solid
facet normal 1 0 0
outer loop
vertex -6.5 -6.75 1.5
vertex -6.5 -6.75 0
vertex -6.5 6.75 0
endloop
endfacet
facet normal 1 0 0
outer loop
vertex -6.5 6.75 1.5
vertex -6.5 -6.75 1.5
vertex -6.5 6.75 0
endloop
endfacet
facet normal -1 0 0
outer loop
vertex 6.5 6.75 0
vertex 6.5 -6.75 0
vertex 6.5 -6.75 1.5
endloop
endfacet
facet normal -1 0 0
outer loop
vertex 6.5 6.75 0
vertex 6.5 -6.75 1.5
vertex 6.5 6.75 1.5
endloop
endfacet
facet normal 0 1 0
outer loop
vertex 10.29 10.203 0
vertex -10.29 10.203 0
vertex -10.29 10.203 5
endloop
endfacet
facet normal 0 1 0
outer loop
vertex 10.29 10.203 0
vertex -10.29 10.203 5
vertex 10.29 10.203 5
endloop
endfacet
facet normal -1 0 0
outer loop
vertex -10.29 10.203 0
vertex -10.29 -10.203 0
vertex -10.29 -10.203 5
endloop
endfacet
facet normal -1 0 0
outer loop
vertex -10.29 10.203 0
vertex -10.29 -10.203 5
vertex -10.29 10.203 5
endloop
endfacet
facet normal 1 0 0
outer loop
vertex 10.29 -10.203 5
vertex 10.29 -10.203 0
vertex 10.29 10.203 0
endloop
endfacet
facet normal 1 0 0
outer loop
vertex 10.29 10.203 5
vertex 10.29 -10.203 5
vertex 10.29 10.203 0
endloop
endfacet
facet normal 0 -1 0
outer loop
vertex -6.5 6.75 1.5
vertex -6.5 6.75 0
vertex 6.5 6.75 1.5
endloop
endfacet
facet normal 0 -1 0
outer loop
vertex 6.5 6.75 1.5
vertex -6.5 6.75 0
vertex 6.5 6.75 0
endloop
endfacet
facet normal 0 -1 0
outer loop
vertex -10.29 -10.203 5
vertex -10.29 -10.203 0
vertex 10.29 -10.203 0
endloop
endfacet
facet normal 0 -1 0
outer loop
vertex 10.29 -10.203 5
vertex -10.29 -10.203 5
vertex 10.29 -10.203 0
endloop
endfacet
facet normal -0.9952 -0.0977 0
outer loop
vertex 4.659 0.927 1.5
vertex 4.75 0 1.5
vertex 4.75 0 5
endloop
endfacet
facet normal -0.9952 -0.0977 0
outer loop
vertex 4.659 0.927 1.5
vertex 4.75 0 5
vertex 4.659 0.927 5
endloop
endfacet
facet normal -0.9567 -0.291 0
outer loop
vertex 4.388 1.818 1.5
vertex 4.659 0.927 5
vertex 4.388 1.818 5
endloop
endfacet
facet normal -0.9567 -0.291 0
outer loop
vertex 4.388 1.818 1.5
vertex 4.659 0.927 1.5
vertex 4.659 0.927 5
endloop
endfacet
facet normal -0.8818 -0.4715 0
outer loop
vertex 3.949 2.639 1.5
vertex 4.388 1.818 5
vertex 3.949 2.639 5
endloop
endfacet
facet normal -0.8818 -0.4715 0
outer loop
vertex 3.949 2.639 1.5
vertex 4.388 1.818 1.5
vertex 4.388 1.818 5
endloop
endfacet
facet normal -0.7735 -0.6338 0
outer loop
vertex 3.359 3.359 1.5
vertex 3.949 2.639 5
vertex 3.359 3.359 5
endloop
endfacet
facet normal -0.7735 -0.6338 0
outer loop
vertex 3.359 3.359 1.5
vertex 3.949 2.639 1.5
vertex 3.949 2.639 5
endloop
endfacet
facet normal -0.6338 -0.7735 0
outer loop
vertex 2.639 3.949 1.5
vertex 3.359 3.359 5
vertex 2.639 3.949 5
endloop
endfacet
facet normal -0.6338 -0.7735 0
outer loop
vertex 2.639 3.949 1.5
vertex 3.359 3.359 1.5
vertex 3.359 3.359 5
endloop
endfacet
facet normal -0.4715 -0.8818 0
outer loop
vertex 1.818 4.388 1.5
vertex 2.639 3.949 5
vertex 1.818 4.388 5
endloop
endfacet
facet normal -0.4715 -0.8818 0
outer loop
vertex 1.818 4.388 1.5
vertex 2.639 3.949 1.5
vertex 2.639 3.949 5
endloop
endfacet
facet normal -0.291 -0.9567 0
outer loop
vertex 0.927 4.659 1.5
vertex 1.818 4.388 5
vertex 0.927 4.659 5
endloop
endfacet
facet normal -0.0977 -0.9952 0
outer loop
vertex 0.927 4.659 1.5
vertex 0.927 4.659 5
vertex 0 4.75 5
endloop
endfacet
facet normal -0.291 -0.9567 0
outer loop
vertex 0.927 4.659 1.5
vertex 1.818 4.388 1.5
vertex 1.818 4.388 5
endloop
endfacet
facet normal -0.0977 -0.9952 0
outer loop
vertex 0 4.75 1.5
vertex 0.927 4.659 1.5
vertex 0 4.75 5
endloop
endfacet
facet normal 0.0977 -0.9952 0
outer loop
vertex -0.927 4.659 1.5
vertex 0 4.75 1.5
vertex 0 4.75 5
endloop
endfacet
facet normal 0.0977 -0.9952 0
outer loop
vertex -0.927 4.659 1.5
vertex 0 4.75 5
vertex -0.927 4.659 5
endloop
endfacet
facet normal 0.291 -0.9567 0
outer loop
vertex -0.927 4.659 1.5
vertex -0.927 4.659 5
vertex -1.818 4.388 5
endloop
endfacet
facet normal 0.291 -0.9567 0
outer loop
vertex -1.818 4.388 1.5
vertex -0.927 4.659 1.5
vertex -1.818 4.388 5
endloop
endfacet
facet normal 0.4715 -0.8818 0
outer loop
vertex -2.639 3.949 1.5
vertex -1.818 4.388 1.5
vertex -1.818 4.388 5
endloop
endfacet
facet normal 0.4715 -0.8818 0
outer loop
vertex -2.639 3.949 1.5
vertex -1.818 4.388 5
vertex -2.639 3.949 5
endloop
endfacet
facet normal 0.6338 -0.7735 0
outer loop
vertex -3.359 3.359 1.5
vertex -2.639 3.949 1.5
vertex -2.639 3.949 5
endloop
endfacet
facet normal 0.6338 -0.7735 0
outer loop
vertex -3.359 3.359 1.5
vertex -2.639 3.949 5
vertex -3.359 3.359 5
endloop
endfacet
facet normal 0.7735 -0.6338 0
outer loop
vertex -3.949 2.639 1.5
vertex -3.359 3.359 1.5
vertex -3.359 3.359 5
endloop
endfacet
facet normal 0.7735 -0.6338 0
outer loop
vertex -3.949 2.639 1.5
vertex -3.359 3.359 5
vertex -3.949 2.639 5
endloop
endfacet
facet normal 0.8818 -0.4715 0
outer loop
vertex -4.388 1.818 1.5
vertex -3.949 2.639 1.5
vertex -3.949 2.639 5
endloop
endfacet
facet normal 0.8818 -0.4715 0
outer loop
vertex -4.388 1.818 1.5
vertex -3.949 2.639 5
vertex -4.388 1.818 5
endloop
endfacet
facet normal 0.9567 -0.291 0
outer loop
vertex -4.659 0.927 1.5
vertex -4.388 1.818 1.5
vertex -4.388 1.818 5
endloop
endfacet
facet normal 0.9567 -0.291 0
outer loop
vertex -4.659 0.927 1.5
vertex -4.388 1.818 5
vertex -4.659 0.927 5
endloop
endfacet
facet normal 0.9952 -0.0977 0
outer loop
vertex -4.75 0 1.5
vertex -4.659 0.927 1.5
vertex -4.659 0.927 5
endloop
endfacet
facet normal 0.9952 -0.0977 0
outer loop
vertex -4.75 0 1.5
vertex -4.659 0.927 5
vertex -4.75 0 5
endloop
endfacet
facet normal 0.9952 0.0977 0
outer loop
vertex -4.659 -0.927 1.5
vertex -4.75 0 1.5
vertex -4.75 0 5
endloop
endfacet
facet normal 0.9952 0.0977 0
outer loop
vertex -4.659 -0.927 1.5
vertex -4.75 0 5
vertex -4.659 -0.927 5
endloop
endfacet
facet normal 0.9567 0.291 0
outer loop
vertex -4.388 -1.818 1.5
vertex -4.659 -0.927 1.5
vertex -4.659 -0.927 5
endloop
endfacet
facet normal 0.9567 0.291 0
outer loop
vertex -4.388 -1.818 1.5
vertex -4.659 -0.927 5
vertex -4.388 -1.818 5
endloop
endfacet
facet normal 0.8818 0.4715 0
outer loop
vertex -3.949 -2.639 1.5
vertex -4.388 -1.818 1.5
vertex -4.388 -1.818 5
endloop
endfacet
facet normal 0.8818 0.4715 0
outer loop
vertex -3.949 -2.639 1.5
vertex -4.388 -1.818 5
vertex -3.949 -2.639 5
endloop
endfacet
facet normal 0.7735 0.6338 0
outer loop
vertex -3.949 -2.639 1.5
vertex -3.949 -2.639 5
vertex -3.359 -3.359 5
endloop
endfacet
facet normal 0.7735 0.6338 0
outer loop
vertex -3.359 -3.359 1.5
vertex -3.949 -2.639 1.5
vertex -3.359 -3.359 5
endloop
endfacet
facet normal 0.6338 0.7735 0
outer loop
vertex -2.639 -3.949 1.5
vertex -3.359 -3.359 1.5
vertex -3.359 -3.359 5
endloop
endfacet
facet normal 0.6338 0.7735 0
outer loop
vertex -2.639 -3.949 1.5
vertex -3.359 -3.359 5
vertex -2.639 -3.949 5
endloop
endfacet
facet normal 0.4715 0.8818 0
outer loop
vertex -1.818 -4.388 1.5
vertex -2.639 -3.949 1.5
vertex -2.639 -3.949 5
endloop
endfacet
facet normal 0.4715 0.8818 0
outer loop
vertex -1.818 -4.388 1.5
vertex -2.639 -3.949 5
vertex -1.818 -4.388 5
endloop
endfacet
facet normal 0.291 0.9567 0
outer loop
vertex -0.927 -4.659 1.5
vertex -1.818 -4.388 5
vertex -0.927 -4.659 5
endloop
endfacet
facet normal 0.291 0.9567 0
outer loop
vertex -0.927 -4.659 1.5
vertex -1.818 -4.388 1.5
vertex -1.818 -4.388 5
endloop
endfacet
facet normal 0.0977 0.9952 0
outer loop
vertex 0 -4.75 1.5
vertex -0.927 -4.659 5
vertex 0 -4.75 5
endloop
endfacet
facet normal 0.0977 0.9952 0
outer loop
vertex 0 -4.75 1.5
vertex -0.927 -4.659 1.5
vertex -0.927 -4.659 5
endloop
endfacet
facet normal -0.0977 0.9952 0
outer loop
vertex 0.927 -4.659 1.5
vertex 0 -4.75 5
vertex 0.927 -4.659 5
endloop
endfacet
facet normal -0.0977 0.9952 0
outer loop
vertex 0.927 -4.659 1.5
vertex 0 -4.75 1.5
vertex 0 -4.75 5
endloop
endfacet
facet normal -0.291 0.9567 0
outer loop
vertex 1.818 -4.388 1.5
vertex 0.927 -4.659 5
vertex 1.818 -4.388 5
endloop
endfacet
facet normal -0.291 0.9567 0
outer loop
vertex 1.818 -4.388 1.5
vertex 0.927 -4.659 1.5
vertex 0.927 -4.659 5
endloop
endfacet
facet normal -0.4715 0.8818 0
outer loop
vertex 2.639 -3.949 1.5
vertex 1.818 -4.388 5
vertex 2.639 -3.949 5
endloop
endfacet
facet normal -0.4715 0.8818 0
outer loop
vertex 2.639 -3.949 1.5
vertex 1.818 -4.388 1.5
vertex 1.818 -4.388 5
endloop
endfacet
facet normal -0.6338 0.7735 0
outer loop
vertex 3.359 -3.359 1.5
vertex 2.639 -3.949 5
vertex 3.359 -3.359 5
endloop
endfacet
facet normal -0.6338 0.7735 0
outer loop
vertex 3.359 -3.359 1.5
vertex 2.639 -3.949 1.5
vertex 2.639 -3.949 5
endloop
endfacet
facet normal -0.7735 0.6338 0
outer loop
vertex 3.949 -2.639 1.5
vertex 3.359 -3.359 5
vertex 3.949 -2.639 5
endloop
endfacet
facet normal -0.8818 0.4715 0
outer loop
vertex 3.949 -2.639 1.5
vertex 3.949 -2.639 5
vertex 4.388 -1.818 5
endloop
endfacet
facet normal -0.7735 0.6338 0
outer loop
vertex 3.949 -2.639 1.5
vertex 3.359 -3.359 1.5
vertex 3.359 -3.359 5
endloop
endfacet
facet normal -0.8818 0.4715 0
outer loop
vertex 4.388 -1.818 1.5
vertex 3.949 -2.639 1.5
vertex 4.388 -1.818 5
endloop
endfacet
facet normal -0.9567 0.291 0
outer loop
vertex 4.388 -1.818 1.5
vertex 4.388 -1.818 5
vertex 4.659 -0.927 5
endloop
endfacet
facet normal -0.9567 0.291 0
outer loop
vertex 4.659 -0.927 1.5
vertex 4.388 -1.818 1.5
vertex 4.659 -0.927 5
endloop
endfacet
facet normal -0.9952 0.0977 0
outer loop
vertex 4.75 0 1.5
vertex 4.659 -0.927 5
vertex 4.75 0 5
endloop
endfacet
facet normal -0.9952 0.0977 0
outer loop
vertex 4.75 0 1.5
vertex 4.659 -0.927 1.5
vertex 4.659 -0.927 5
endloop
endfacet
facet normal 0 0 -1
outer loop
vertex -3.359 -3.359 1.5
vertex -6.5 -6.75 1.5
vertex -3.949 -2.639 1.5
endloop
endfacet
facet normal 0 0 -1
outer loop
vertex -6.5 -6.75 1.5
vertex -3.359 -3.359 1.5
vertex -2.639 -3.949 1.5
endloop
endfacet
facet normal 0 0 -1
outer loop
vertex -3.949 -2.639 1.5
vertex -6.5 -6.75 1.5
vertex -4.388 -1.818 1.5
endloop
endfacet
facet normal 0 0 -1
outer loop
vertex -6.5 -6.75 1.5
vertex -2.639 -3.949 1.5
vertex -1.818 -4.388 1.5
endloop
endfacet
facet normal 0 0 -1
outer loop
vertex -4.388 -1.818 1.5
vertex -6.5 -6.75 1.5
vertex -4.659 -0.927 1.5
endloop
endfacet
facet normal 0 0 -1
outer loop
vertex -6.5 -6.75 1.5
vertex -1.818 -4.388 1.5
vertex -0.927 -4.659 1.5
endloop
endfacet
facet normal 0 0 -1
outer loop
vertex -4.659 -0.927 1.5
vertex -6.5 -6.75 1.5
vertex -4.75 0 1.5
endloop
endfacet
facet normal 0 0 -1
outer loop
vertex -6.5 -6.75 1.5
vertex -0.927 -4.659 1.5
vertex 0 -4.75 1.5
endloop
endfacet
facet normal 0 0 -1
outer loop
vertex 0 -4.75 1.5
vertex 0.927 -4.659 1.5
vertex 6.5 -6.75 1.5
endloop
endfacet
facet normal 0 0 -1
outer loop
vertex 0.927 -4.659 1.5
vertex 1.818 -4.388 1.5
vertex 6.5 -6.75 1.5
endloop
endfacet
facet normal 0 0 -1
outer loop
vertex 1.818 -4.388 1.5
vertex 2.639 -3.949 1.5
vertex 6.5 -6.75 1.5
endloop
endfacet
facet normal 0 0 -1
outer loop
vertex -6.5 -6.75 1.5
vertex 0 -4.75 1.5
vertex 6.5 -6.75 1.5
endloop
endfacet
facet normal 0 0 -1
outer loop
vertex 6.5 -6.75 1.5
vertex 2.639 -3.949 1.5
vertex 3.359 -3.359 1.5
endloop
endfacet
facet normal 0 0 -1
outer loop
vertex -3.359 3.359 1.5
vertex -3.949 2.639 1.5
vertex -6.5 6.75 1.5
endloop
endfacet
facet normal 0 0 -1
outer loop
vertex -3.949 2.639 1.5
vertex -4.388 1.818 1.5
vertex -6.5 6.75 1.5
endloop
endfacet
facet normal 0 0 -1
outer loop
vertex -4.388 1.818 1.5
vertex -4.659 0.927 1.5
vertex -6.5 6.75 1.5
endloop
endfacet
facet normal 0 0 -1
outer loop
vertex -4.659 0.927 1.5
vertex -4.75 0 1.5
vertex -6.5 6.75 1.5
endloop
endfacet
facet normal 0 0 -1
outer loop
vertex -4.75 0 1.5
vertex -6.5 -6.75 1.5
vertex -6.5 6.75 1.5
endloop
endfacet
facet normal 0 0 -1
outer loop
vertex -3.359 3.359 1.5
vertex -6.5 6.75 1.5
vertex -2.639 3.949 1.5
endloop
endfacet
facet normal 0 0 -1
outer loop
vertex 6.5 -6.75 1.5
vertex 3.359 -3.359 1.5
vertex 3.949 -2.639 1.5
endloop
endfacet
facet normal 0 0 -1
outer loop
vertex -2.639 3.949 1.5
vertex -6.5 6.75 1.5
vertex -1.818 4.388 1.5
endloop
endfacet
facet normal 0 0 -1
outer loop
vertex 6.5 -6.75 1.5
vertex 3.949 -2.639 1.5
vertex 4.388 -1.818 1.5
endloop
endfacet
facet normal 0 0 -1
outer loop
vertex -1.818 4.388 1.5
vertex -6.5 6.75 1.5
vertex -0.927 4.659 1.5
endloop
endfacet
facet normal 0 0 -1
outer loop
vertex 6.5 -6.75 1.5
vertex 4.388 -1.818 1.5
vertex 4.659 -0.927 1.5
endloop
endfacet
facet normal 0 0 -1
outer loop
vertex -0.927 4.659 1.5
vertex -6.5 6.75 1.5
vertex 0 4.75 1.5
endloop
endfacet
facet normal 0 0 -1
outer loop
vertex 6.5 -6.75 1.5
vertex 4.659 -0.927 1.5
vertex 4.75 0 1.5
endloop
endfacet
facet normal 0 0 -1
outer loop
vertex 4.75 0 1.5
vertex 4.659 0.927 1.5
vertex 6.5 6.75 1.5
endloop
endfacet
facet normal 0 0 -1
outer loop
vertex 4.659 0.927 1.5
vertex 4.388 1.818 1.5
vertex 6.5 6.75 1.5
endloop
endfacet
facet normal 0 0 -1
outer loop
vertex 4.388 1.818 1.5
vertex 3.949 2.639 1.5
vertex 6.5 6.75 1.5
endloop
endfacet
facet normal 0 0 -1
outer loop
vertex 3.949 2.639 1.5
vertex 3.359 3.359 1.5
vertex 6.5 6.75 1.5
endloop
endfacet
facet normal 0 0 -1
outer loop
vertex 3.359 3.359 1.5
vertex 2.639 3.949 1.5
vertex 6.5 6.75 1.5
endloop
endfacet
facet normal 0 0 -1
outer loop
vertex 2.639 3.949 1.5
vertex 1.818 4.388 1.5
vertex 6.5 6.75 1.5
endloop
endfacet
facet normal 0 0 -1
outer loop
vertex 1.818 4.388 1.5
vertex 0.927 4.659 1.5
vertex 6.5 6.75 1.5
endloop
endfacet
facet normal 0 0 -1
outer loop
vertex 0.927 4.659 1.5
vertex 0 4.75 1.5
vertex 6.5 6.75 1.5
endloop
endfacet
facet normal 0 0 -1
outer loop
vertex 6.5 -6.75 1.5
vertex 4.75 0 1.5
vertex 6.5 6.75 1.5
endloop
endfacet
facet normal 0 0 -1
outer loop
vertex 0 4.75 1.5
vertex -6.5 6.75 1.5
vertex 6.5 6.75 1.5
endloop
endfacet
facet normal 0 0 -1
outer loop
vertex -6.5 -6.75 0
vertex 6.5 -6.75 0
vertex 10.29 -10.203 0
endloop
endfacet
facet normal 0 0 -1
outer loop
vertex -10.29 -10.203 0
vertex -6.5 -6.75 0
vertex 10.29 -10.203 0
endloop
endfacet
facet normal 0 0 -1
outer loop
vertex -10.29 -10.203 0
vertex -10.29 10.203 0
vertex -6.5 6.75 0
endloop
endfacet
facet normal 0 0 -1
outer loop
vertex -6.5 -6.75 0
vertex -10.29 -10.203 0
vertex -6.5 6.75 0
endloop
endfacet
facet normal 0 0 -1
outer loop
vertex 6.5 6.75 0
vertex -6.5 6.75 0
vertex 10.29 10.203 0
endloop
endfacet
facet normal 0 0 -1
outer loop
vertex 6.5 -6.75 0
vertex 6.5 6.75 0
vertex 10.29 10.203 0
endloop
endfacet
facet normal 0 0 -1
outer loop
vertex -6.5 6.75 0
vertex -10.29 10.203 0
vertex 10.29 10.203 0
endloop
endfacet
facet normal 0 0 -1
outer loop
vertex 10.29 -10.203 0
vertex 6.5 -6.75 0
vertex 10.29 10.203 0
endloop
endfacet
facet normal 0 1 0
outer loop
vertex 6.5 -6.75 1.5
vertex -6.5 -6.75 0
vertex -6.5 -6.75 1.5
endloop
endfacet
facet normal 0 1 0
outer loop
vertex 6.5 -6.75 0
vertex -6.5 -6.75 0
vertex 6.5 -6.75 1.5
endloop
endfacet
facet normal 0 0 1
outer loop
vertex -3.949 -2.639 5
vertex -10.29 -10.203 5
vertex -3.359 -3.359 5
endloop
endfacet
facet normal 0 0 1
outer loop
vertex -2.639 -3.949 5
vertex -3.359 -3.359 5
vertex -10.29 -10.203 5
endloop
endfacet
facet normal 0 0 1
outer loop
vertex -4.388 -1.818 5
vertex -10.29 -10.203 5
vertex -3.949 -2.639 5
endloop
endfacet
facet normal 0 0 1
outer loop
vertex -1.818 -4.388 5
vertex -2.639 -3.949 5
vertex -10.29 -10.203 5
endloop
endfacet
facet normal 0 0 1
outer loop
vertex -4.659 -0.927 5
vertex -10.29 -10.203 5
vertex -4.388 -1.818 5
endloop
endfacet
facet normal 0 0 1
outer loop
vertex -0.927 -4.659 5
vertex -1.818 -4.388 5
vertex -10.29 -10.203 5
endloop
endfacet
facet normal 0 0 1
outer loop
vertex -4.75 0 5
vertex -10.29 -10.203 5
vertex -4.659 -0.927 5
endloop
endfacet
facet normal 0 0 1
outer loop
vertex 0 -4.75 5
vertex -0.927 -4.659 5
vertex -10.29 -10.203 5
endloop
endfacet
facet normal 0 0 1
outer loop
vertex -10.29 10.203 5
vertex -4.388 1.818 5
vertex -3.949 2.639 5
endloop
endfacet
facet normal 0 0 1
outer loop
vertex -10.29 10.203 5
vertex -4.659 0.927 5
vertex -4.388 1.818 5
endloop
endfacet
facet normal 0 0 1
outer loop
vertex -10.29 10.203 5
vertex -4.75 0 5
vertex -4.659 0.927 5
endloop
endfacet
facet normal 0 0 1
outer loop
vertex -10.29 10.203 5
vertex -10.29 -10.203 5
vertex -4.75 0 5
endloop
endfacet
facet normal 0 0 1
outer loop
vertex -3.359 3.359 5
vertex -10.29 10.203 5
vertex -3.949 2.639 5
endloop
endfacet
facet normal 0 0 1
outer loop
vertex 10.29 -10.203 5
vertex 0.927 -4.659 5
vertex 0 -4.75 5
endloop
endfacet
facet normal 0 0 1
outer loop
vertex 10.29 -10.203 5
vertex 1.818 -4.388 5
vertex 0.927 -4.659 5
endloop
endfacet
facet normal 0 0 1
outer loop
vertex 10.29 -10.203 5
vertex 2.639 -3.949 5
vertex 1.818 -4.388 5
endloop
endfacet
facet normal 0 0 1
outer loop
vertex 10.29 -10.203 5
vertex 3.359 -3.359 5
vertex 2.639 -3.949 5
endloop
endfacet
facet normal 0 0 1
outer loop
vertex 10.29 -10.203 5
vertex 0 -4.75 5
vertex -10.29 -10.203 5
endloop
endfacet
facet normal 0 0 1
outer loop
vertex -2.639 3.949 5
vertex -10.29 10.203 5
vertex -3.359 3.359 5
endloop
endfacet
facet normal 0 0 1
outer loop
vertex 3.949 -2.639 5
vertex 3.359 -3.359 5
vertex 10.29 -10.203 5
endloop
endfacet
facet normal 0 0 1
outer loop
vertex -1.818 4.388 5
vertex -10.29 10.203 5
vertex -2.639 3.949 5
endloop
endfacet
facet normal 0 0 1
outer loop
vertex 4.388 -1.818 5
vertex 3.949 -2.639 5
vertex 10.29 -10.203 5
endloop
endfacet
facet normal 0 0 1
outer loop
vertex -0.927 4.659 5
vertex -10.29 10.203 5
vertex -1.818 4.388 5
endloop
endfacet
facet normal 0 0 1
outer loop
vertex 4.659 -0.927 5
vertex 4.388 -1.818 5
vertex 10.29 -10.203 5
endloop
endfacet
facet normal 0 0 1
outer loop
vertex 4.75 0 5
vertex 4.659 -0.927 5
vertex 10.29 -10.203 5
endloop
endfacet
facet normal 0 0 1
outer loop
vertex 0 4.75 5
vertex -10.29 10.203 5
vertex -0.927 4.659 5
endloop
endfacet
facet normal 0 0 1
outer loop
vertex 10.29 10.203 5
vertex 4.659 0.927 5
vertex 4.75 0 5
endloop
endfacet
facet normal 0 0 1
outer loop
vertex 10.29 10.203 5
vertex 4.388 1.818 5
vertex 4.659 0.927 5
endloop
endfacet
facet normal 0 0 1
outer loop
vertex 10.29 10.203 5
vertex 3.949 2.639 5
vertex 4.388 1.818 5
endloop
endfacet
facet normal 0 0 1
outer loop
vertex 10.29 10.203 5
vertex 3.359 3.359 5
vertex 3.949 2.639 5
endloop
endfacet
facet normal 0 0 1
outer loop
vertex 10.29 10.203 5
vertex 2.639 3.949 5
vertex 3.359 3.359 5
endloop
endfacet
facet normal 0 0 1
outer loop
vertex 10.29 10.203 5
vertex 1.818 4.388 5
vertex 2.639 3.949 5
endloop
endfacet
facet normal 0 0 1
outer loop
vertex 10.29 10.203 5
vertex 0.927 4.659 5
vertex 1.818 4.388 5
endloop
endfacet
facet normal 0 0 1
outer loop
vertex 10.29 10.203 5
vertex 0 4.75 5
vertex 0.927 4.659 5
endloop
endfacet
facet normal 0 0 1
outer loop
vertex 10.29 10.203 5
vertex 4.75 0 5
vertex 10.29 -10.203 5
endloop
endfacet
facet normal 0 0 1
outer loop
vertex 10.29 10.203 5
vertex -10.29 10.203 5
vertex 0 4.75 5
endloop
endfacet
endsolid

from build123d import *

# Parameters (mm, degrees)
F0_W     = 20.5790107138
F0_H     = 20.4056631774
F0_W_2   = 13
F0_H_2   = 13.5
F0_R     = 4.75
F1_DEPTH = 5
F2_DEPTH = 1.5


with BuildPart() as f1:
    # F0 (on Top) → F1 (new body)
    with BuildSketch(Plane.XY):
        Rectangle(F0_W, F0_H)
        Rectangle(F0_W_2, F0_H_2, mode=Mode.SUBTRACT)
        Rectangle(F0_W_2, F0_H_2)
        Circle(F0_R, mode=Mode.SUBTRACT)
    extrude(amount=F1_DEPTH)

    # F0 (on Top) → F2 (cut)
    with BuildSketch(Plane.XY):
        Rectangle(F0_W_2, F0_H_2)
        Circle(F0_R, mode=Mode.SUBTRACT)
    extrude(amount=F2_DEPTH, mode=Mode.SUBTRACT)


solid = f1.part
